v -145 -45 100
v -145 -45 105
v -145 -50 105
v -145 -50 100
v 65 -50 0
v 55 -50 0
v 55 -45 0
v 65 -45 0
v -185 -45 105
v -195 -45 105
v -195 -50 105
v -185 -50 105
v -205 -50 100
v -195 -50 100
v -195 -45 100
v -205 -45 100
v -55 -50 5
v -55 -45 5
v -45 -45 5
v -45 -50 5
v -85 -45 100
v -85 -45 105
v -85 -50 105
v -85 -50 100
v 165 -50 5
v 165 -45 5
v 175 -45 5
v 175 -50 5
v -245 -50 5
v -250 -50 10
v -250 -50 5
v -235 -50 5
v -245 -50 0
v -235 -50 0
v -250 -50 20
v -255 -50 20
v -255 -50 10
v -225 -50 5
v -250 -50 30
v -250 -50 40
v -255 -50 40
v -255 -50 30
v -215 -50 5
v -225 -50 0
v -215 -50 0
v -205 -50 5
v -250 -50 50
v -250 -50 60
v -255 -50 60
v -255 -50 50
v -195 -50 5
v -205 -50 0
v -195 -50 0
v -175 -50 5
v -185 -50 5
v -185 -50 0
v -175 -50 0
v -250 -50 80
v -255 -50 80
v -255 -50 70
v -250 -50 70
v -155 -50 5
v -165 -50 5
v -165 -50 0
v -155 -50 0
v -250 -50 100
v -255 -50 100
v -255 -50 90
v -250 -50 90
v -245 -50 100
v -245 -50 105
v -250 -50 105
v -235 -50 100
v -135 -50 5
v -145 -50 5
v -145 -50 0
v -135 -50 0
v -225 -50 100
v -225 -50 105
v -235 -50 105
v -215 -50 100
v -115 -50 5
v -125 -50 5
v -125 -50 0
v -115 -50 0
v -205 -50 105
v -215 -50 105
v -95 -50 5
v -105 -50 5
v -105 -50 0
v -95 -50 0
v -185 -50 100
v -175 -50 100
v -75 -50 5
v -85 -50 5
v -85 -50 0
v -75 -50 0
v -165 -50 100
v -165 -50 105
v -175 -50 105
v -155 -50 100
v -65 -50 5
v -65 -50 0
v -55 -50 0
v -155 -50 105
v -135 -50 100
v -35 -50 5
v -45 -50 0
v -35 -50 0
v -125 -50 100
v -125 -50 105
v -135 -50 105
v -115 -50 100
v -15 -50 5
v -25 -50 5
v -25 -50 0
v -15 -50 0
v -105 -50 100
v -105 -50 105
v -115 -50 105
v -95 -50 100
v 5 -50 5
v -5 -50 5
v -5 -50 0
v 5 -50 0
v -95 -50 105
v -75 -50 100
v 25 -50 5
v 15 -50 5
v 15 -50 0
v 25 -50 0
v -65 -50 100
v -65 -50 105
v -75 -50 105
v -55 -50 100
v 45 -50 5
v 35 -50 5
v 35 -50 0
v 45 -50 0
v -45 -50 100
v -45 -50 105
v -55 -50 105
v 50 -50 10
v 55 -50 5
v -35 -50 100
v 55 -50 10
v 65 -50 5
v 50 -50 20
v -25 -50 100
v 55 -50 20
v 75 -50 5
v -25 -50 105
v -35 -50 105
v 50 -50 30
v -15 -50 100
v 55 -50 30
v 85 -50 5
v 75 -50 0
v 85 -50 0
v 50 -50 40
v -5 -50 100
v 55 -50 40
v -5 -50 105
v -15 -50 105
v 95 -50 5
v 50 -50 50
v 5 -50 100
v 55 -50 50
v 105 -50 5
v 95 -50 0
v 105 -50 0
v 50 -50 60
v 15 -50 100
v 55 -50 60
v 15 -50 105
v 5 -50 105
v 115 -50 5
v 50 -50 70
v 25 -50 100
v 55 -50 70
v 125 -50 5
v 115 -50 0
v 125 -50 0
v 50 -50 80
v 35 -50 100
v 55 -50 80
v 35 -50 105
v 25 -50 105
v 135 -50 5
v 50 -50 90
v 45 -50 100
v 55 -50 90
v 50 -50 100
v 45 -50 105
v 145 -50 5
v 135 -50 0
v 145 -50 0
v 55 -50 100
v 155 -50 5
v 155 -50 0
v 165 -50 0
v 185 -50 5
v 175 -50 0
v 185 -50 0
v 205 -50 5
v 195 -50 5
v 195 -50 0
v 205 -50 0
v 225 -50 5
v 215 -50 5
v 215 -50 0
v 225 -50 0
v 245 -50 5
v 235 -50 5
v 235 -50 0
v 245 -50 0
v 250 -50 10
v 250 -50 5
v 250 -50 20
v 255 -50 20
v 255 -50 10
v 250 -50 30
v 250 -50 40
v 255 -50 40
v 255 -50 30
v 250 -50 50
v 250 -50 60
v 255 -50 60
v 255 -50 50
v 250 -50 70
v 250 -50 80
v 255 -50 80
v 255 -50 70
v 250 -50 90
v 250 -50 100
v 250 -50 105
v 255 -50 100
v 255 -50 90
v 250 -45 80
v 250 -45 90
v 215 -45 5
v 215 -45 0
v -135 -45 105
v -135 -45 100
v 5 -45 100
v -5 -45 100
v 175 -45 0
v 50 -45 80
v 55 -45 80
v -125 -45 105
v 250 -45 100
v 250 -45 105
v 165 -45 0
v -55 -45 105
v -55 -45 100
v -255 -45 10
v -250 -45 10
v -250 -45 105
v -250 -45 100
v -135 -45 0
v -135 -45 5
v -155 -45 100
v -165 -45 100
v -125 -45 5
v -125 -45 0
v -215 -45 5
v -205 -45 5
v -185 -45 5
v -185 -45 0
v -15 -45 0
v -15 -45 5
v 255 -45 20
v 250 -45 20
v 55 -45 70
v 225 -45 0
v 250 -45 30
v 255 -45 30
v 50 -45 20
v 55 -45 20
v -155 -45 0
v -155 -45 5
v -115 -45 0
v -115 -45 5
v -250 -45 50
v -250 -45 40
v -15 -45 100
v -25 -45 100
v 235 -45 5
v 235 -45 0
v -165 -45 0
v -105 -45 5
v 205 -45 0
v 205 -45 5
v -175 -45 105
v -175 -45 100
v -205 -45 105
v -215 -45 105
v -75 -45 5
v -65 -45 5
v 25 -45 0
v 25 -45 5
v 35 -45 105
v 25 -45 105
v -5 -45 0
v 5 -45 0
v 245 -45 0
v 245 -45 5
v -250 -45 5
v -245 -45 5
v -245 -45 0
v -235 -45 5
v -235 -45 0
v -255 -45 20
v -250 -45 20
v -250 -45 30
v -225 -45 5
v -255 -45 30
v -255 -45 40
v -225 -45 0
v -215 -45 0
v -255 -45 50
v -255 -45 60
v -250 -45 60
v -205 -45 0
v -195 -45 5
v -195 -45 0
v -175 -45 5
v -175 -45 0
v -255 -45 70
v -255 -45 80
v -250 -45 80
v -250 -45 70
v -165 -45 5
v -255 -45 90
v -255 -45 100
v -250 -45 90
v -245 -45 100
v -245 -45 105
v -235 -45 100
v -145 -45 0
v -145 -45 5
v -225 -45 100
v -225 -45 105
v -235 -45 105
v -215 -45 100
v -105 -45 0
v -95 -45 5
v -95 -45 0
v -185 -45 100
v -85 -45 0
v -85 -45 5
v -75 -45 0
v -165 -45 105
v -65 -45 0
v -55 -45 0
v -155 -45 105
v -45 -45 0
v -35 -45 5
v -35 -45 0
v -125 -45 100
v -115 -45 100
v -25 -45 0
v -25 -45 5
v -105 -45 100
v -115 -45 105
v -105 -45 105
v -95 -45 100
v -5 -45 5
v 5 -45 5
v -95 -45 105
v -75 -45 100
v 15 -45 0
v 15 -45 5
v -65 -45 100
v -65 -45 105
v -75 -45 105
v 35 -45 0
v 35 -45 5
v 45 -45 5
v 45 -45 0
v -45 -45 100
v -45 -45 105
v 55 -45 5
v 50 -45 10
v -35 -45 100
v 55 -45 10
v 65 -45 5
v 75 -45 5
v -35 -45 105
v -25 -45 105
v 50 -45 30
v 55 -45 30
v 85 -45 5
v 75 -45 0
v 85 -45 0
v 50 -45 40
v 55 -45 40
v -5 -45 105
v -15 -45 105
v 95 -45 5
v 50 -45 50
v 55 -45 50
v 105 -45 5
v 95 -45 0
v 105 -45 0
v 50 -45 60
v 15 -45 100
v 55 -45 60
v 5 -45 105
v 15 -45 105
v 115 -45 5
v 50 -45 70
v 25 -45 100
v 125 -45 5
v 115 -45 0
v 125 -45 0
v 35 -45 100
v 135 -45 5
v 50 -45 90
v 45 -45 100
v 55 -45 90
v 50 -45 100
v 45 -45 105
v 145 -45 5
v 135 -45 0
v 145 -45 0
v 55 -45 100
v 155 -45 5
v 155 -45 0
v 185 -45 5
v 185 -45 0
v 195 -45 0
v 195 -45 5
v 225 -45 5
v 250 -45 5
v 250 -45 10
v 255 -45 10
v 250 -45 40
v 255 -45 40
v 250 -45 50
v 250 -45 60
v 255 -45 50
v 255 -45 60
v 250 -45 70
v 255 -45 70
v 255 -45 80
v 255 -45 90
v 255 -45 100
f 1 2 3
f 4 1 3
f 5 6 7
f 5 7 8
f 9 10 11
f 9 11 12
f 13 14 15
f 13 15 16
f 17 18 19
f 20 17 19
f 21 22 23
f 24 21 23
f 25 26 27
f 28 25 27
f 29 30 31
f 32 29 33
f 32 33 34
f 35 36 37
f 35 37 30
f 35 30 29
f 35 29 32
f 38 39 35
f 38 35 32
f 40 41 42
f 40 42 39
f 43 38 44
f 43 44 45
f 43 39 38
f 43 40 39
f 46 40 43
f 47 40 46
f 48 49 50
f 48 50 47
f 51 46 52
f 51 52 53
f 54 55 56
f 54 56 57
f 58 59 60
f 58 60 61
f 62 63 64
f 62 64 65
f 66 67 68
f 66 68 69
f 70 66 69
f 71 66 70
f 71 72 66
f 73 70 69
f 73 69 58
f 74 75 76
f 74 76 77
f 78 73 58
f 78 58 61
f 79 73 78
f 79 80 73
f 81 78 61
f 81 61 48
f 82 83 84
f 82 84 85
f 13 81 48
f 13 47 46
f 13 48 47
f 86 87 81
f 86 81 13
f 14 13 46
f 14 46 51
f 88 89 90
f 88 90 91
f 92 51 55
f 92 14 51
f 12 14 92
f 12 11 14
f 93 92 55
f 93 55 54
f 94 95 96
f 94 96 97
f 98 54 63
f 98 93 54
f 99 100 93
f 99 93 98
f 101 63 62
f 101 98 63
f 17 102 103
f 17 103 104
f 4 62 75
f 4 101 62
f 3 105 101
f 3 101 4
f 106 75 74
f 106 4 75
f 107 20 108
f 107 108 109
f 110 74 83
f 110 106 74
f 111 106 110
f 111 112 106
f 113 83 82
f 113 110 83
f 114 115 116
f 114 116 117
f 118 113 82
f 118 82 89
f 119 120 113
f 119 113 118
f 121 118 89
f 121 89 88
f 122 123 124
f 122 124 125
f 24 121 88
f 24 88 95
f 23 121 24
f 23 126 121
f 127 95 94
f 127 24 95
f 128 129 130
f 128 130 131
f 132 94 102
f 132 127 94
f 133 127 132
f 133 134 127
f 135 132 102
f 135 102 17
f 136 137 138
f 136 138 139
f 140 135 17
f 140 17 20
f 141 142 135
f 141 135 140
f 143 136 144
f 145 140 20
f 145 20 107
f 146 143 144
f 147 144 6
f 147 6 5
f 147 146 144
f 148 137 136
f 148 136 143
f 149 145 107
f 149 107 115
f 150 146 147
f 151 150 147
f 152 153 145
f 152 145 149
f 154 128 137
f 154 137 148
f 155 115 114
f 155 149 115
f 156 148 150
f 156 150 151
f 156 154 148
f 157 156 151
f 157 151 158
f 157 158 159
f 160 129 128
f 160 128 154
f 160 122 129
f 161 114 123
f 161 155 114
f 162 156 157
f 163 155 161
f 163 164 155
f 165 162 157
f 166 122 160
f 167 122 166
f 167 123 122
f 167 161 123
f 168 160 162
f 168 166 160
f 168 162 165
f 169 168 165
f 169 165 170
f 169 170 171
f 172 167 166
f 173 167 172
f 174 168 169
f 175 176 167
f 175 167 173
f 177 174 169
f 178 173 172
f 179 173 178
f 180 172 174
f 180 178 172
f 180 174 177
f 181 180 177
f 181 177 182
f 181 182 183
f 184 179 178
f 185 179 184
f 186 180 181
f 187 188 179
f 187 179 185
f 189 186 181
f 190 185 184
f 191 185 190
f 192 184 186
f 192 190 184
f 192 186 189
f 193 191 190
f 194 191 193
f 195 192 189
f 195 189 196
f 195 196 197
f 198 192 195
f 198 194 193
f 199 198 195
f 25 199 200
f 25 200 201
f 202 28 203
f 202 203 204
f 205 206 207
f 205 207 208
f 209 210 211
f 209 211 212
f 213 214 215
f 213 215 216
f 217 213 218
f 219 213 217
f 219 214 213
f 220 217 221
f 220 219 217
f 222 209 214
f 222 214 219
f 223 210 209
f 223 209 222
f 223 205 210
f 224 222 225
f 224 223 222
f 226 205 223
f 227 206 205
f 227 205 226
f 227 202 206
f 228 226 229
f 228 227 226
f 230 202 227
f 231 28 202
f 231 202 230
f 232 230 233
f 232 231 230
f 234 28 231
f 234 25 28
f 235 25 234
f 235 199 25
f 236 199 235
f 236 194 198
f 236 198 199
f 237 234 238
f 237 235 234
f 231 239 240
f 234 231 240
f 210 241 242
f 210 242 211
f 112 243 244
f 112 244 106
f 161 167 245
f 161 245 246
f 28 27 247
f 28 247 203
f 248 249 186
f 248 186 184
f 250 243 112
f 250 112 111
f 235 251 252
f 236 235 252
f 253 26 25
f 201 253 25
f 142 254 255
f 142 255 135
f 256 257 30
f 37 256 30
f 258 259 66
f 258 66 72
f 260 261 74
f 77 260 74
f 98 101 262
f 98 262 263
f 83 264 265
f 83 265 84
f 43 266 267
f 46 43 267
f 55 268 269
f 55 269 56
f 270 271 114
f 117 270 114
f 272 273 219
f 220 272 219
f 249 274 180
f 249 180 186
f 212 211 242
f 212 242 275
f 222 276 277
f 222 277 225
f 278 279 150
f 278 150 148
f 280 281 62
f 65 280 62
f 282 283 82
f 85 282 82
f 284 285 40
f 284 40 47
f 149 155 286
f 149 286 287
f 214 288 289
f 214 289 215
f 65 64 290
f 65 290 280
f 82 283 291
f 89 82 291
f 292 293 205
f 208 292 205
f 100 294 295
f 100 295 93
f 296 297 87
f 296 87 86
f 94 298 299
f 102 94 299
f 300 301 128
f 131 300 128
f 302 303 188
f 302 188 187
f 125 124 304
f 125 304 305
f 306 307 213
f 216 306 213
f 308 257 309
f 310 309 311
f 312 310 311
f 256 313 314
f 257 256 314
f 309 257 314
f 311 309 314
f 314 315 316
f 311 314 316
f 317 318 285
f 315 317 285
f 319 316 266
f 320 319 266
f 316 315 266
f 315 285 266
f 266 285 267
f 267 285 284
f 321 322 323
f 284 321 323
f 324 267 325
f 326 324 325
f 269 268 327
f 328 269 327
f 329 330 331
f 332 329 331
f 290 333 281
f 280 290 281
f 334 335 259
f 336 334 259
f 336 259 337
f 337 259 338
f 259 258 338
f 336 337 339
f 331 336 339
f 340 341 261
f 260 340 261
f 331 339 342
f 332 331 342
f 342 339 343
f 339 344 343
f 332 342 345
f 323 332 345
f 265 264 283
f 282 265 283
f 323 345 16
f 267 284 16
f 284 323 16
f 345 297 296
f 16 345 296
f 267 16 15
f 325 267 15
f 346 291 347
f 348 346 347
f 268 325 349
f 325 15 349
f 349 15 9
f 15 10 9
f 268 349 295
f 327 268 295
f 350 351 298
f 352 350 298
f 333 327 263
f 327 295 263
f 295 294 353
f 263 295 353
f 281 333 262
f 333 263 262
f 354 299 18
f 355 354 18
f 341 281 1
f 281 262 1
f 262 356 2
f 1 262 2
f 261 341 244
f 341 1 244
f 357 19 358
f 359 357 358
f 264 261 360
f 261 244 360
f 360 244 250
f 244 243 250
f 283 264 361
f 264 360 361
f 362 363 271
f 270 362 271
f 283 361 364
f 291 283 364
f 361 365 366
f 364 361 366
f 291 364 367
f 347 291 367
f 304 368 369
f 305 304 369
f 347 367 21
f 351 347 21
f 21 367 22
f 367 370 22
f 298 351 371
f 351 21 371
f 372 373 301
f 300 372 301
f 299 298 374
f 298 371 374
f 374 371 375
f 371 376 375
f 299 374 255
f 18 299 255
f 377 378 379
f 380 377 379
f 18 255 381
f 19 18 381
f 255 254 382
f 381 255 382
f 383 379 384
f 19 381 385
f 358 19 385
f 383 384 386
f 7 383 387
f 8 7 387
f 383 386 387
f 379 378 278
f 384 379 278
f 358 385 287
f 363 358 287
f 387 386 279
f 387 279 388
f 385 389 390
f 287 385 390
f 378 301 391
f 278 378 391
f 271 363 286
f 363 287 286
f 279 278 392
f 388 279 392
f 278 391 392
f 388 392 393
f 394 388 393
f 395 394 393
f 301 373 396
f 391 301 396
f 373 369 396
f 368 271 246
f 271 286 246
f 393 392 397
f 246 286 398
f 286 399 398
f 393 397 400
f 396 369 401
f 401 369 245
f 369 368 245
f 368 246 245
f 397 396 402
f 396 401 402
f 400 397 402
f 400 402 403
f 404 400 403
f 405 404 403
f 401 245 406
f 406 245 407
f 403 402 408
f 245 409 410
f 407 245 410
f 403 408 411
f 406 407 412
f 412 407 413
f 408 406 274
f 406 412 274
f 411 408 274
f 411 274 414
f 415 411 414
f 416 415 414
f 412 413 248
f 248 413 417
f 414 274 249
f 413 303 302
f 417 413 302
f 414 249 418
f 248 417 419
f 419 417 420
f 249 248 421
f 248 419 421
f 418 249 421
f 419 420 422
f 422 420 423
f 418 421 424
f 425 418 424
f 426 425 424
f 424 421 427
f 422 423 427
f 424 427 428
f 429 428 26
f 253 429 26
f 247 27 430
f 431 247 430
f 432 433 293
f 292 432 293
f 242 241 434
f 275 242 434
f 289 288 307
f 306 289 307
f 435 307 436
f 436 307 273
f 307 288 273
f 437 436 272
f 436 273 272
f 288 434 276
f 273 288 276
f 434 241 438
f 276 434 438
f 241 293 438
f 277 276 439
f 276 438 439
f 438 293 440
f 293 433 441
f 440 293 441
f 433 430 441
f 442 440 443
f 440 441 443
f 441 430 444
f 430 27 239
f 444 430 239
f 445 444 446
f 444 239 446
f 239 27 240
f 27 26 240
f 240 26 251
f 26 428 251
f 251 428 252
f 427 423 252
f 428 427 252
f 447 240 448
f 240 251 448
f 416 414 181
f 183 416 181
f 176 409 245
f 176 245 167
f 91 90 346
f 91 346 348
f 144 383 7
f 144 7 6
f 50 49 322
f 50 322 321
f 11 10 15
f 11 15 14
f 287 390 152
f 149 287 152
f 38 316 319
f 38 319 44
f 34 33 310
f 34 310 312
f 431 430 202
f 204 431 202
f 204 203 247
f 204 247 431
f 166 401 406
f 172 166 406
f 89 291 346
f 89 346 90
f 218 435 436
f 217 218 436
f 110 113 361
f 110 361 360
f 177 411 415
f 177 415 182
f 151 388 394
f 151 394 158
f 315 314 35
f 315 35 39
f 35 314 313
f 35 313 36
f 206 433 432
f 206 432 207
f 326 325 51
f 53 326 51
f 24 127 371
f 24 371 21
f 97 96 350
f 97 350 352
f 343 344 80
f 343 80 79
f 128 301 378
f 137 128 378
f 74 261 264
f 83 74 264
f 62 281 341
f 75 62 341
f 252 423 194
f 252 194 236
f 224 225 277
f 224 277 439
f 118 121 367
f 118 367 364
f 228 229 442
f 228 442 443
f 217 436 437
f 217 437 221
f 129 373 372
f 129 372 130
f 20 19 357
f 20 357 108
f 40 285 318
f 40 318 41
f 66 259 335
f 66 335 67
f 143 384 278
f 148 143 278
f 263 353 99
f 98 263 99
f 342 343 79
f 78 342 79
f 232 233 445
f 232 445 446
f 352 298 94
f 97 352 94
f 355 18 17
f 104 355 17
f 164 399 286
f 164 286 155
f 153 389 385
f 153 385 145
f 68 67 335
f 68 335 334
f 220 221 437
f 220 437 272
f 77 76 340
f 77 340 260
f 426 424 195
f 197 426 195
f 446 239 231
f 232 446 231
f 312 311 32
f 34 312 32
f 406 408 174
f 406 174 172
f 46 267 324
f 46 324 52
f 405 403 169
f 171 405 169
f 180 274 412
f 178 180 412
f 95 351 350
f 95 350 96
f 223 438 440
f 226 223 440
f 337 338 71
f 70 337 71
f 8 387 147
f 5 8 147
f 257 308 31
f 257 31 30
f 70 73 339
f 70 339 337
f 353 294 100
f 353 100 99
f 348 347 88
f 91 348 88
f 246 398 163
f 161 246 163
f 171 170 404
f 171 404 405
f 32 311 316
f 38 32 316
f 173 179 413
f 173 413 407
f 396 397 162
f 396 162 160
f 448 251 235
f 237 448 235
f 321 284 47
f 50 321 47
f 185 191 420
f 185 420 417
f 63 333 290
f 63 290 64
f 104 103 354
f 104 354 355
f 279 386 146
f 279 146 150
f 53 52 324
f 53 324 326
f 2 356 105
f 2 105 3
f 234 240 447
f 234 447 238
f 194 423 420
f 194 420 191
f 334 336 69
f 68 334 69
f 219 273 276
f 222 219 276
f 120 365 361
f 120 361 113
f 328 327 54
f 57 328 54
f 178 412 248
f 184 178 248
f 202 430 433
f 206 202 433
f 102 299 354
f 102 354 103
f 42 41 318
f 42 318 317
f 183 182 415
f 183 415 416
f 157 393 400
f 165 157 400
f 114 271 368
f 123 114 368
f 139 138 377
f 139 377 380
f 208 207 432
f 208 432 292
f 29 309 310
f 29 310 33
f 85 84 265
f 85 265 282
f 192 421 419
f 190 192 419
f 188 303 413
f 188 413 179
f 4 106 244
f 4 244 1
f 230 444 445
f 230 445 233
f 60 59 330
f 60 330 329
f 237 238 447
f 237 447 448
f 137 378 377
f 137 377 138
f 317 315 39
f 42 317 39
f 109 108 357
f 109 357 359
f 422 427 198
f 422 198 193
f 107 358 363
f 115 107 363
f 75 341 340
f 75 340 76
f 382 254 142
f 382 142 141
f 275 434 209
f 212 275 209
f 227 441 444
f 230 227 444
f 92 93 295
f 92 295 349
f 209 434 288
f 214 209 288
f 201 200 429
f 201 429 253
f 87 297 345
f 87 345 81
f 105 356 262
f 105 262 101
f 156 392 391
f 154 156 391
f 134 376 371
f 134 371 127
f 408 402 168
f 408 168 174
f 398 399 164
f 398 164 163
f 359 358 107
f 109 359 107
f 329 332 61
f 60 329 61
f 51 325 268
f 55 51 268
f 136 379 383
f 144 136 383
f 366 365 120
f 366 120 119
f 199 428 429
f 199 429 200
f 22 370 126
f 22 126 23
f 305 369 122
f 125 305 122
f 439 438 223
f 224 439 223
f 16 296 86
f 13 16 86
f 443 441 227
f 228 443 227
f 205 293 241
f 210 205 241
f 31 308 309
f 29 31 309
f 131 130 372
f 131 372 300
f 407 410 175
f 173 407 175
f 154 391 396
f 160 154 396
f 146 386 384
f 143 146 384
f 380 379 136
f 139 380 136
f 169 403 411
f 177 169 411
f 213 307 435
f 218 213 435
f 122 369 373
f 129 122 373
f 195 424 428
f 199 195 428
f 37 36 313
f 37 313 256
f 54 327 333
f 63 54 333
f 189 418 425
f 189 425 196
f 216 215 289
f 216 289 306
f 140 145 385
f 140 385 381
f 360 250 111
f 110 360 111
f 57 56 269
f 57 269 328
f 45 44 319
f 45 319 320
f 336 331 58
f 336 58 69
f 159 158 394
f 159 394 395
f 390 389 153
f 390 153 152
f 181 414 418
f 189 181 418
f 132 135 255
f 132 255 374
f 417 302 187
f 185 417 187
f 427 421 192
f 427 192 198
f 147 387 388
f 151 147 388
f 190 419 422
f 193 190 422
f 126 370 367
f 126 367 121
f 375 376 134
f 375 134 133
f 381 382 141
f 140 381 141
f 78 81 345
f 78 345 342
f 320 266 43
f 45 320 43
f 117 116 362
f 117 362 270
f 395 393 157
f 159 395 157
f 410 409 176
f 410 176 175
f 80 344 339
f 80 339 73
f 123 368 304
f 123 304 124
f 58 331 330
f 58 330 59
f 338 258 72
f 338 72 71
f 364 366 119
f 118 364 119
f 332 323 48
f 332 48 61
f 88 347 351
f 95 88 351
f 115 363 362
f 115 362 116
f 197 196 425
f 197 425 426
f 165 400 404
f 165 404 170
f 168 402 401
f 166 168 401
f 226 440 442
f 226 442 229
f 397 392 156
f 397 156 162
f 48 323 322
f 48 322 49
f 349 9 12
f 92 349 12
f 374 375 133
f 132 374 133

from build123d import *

# Parameters (mm, degrees)
SKETCH088_W             = 500
SKETCH088_H             = 100
PAD047_DEPTH            = 5
SKETCH089_W             = 10
SKETCH089_H             = 5
PAD048_DEPTH            = 5
LINEARPATTERN046_COUNT  = 25
LINEARPATTERN046_PITCH  = 20
SKETCH090_W             = 10
SKETCH090_H             = 5
PAD049_DEPTH            = 5
LINEARPATTERN047_COUNT  = 5
LINEARPATTERN047_PITCH  = 20
SKETCH091_W             = 10
SKETCH091_H             = 5
PAD050_DEPTH            = 5
LINEARPATTERN048_COUNT  = 5
LINEARPATTERN048_PITCH  = 20
SKETCH119_W             = 5
SKETCH119_H             = 10
POCKET029_DEPTH         = 5
LINEARPATTERN071_COUNT  = 5
LINEARPATTERN071_PITCH  = 20
SKETCH130_W             = 10
SKETCH130_H             = 5
POCKET039_DEPTH         = 5
LINEARPATTERN082_COUNT  = 15
LINEARPATTERN082_PITCH  = 20
BODY035_PLACEMENT_ANGLE = 90


with BuildPart() as part:
    # Sketch088 → Pad047 (new body)
    with BuildSketch(Plane.XY):
        Rectangle(SKETCH088_W, SKETCH088_H)
    extrude(amount=PAD047_DEPTH)

    # Sketch089 (on DatumPlane) → Pad048 (join)
    with BuildSketch(Plane.XZ.offset(50)):
        with Locations((-240, 2.5)):
            Rectangle(SKETCH089_W, SKETCH089_H)
    pad048 = extrude(amount=PAD048_DEPTH)

    # LinearPattern046: Pad048 ×25
    with Locations(*[(i * LINEARPATTERN046_PITCH, 0, 0) for i in range(1, LINEARPATTERN046_COUNT)]):
        add(pad048)

    # Sketch090 (on DatumPlane) → Pad049 (join)
    with BuildSketch(Plane.YZ.offset(250)):
        with Locations((-40, 2.5)):
            Rectangle(SKETCH090_W, SKETCH090_H)
    pad049 = extrude(amount=PAD049_DEPTH)

    # LinearPattern047: Pad049 ×5
    with Locations(*[(0, i * LINEARPATTERN047_PITCH, 0) for i in range(1, LINEARPATTERN047_COUNT)]):
        add(pad049)

    # Sketch091 (on DatumPlane) → Pad050 (join)
    with BuildSketch(Plane(origin=(-250, 0, 0), x_dir=(0, -1, 0), z_dir=(-1, 0, 0))):
        with Locations((-40, 2.5)):
            Rectangle(SKETCH091_W, SKETCH091_H)
    pad050 = extrude(amount=PAD050_DEPTH)

    # LinearPattern048: Pad050 ×5
    with Locations(*[(0, -i * LINEARPATTERN048_PITCH, 0) for i in range(1, LINEARPATTERN048_COUNT)]):
        add(pad050)

    # Sketch119 (on DatumPlane) → Pocket029 (cut)
    with BuildSketch(Plane(origin=(0, 0, 0), x_dir=(-1, 0, 0), z_dir=(0, 0, -1))):
        with Locations((-52.5, 40)):
            Rectangle(SKETCH119_W, SKETCH119_H)
    pocket029 = extrude(amount=-POCKET029_DEPTH, mode=Mode.SUBTRACT)

    # LinearPattern071: Pocket029 ×5
    with Locations(*[(0, -i * LINEARPATTERN071_PITCH, 0) for i in range(1, LINEARPATTERN071_COUNT)]):
        add(pocket029, mode=Mode.SUBTRACT)

    # Sketch130 (on DatumPlane) → Pocket039 (cut)
    with BuildSketch(Plane(origin=(0, 50, 0), x_dir=(-1, 0, 0), z_dir=(0, 1, 0))):
        with Locations((240, 2.5)):
            Rectangle(SKETCH130_W, SKETCH130_H)
    pocket039 = extrude(amount=-POCKET039_DEPTH, mode=Mode.SUBTRACT)

    # LinearPattern082: Pocket039 ×15
    with Locations(*[(i * LINEARPATTERN082_PITCH, 0, 0) for i in range(1, LINEARPATTERN082_COUNT)]):
        add(pocket039, mode=Mode.SUBTRACT)


with BuildPart() as part_1:
    # Body035 placement: moved
    add(part.part.moved(Location((0, -45, 55))).rotate(Axis((0, -45, 55), (1, 0, 0)), BODY035_PLACEMENT_ANGLE))


solid = part_1.part
